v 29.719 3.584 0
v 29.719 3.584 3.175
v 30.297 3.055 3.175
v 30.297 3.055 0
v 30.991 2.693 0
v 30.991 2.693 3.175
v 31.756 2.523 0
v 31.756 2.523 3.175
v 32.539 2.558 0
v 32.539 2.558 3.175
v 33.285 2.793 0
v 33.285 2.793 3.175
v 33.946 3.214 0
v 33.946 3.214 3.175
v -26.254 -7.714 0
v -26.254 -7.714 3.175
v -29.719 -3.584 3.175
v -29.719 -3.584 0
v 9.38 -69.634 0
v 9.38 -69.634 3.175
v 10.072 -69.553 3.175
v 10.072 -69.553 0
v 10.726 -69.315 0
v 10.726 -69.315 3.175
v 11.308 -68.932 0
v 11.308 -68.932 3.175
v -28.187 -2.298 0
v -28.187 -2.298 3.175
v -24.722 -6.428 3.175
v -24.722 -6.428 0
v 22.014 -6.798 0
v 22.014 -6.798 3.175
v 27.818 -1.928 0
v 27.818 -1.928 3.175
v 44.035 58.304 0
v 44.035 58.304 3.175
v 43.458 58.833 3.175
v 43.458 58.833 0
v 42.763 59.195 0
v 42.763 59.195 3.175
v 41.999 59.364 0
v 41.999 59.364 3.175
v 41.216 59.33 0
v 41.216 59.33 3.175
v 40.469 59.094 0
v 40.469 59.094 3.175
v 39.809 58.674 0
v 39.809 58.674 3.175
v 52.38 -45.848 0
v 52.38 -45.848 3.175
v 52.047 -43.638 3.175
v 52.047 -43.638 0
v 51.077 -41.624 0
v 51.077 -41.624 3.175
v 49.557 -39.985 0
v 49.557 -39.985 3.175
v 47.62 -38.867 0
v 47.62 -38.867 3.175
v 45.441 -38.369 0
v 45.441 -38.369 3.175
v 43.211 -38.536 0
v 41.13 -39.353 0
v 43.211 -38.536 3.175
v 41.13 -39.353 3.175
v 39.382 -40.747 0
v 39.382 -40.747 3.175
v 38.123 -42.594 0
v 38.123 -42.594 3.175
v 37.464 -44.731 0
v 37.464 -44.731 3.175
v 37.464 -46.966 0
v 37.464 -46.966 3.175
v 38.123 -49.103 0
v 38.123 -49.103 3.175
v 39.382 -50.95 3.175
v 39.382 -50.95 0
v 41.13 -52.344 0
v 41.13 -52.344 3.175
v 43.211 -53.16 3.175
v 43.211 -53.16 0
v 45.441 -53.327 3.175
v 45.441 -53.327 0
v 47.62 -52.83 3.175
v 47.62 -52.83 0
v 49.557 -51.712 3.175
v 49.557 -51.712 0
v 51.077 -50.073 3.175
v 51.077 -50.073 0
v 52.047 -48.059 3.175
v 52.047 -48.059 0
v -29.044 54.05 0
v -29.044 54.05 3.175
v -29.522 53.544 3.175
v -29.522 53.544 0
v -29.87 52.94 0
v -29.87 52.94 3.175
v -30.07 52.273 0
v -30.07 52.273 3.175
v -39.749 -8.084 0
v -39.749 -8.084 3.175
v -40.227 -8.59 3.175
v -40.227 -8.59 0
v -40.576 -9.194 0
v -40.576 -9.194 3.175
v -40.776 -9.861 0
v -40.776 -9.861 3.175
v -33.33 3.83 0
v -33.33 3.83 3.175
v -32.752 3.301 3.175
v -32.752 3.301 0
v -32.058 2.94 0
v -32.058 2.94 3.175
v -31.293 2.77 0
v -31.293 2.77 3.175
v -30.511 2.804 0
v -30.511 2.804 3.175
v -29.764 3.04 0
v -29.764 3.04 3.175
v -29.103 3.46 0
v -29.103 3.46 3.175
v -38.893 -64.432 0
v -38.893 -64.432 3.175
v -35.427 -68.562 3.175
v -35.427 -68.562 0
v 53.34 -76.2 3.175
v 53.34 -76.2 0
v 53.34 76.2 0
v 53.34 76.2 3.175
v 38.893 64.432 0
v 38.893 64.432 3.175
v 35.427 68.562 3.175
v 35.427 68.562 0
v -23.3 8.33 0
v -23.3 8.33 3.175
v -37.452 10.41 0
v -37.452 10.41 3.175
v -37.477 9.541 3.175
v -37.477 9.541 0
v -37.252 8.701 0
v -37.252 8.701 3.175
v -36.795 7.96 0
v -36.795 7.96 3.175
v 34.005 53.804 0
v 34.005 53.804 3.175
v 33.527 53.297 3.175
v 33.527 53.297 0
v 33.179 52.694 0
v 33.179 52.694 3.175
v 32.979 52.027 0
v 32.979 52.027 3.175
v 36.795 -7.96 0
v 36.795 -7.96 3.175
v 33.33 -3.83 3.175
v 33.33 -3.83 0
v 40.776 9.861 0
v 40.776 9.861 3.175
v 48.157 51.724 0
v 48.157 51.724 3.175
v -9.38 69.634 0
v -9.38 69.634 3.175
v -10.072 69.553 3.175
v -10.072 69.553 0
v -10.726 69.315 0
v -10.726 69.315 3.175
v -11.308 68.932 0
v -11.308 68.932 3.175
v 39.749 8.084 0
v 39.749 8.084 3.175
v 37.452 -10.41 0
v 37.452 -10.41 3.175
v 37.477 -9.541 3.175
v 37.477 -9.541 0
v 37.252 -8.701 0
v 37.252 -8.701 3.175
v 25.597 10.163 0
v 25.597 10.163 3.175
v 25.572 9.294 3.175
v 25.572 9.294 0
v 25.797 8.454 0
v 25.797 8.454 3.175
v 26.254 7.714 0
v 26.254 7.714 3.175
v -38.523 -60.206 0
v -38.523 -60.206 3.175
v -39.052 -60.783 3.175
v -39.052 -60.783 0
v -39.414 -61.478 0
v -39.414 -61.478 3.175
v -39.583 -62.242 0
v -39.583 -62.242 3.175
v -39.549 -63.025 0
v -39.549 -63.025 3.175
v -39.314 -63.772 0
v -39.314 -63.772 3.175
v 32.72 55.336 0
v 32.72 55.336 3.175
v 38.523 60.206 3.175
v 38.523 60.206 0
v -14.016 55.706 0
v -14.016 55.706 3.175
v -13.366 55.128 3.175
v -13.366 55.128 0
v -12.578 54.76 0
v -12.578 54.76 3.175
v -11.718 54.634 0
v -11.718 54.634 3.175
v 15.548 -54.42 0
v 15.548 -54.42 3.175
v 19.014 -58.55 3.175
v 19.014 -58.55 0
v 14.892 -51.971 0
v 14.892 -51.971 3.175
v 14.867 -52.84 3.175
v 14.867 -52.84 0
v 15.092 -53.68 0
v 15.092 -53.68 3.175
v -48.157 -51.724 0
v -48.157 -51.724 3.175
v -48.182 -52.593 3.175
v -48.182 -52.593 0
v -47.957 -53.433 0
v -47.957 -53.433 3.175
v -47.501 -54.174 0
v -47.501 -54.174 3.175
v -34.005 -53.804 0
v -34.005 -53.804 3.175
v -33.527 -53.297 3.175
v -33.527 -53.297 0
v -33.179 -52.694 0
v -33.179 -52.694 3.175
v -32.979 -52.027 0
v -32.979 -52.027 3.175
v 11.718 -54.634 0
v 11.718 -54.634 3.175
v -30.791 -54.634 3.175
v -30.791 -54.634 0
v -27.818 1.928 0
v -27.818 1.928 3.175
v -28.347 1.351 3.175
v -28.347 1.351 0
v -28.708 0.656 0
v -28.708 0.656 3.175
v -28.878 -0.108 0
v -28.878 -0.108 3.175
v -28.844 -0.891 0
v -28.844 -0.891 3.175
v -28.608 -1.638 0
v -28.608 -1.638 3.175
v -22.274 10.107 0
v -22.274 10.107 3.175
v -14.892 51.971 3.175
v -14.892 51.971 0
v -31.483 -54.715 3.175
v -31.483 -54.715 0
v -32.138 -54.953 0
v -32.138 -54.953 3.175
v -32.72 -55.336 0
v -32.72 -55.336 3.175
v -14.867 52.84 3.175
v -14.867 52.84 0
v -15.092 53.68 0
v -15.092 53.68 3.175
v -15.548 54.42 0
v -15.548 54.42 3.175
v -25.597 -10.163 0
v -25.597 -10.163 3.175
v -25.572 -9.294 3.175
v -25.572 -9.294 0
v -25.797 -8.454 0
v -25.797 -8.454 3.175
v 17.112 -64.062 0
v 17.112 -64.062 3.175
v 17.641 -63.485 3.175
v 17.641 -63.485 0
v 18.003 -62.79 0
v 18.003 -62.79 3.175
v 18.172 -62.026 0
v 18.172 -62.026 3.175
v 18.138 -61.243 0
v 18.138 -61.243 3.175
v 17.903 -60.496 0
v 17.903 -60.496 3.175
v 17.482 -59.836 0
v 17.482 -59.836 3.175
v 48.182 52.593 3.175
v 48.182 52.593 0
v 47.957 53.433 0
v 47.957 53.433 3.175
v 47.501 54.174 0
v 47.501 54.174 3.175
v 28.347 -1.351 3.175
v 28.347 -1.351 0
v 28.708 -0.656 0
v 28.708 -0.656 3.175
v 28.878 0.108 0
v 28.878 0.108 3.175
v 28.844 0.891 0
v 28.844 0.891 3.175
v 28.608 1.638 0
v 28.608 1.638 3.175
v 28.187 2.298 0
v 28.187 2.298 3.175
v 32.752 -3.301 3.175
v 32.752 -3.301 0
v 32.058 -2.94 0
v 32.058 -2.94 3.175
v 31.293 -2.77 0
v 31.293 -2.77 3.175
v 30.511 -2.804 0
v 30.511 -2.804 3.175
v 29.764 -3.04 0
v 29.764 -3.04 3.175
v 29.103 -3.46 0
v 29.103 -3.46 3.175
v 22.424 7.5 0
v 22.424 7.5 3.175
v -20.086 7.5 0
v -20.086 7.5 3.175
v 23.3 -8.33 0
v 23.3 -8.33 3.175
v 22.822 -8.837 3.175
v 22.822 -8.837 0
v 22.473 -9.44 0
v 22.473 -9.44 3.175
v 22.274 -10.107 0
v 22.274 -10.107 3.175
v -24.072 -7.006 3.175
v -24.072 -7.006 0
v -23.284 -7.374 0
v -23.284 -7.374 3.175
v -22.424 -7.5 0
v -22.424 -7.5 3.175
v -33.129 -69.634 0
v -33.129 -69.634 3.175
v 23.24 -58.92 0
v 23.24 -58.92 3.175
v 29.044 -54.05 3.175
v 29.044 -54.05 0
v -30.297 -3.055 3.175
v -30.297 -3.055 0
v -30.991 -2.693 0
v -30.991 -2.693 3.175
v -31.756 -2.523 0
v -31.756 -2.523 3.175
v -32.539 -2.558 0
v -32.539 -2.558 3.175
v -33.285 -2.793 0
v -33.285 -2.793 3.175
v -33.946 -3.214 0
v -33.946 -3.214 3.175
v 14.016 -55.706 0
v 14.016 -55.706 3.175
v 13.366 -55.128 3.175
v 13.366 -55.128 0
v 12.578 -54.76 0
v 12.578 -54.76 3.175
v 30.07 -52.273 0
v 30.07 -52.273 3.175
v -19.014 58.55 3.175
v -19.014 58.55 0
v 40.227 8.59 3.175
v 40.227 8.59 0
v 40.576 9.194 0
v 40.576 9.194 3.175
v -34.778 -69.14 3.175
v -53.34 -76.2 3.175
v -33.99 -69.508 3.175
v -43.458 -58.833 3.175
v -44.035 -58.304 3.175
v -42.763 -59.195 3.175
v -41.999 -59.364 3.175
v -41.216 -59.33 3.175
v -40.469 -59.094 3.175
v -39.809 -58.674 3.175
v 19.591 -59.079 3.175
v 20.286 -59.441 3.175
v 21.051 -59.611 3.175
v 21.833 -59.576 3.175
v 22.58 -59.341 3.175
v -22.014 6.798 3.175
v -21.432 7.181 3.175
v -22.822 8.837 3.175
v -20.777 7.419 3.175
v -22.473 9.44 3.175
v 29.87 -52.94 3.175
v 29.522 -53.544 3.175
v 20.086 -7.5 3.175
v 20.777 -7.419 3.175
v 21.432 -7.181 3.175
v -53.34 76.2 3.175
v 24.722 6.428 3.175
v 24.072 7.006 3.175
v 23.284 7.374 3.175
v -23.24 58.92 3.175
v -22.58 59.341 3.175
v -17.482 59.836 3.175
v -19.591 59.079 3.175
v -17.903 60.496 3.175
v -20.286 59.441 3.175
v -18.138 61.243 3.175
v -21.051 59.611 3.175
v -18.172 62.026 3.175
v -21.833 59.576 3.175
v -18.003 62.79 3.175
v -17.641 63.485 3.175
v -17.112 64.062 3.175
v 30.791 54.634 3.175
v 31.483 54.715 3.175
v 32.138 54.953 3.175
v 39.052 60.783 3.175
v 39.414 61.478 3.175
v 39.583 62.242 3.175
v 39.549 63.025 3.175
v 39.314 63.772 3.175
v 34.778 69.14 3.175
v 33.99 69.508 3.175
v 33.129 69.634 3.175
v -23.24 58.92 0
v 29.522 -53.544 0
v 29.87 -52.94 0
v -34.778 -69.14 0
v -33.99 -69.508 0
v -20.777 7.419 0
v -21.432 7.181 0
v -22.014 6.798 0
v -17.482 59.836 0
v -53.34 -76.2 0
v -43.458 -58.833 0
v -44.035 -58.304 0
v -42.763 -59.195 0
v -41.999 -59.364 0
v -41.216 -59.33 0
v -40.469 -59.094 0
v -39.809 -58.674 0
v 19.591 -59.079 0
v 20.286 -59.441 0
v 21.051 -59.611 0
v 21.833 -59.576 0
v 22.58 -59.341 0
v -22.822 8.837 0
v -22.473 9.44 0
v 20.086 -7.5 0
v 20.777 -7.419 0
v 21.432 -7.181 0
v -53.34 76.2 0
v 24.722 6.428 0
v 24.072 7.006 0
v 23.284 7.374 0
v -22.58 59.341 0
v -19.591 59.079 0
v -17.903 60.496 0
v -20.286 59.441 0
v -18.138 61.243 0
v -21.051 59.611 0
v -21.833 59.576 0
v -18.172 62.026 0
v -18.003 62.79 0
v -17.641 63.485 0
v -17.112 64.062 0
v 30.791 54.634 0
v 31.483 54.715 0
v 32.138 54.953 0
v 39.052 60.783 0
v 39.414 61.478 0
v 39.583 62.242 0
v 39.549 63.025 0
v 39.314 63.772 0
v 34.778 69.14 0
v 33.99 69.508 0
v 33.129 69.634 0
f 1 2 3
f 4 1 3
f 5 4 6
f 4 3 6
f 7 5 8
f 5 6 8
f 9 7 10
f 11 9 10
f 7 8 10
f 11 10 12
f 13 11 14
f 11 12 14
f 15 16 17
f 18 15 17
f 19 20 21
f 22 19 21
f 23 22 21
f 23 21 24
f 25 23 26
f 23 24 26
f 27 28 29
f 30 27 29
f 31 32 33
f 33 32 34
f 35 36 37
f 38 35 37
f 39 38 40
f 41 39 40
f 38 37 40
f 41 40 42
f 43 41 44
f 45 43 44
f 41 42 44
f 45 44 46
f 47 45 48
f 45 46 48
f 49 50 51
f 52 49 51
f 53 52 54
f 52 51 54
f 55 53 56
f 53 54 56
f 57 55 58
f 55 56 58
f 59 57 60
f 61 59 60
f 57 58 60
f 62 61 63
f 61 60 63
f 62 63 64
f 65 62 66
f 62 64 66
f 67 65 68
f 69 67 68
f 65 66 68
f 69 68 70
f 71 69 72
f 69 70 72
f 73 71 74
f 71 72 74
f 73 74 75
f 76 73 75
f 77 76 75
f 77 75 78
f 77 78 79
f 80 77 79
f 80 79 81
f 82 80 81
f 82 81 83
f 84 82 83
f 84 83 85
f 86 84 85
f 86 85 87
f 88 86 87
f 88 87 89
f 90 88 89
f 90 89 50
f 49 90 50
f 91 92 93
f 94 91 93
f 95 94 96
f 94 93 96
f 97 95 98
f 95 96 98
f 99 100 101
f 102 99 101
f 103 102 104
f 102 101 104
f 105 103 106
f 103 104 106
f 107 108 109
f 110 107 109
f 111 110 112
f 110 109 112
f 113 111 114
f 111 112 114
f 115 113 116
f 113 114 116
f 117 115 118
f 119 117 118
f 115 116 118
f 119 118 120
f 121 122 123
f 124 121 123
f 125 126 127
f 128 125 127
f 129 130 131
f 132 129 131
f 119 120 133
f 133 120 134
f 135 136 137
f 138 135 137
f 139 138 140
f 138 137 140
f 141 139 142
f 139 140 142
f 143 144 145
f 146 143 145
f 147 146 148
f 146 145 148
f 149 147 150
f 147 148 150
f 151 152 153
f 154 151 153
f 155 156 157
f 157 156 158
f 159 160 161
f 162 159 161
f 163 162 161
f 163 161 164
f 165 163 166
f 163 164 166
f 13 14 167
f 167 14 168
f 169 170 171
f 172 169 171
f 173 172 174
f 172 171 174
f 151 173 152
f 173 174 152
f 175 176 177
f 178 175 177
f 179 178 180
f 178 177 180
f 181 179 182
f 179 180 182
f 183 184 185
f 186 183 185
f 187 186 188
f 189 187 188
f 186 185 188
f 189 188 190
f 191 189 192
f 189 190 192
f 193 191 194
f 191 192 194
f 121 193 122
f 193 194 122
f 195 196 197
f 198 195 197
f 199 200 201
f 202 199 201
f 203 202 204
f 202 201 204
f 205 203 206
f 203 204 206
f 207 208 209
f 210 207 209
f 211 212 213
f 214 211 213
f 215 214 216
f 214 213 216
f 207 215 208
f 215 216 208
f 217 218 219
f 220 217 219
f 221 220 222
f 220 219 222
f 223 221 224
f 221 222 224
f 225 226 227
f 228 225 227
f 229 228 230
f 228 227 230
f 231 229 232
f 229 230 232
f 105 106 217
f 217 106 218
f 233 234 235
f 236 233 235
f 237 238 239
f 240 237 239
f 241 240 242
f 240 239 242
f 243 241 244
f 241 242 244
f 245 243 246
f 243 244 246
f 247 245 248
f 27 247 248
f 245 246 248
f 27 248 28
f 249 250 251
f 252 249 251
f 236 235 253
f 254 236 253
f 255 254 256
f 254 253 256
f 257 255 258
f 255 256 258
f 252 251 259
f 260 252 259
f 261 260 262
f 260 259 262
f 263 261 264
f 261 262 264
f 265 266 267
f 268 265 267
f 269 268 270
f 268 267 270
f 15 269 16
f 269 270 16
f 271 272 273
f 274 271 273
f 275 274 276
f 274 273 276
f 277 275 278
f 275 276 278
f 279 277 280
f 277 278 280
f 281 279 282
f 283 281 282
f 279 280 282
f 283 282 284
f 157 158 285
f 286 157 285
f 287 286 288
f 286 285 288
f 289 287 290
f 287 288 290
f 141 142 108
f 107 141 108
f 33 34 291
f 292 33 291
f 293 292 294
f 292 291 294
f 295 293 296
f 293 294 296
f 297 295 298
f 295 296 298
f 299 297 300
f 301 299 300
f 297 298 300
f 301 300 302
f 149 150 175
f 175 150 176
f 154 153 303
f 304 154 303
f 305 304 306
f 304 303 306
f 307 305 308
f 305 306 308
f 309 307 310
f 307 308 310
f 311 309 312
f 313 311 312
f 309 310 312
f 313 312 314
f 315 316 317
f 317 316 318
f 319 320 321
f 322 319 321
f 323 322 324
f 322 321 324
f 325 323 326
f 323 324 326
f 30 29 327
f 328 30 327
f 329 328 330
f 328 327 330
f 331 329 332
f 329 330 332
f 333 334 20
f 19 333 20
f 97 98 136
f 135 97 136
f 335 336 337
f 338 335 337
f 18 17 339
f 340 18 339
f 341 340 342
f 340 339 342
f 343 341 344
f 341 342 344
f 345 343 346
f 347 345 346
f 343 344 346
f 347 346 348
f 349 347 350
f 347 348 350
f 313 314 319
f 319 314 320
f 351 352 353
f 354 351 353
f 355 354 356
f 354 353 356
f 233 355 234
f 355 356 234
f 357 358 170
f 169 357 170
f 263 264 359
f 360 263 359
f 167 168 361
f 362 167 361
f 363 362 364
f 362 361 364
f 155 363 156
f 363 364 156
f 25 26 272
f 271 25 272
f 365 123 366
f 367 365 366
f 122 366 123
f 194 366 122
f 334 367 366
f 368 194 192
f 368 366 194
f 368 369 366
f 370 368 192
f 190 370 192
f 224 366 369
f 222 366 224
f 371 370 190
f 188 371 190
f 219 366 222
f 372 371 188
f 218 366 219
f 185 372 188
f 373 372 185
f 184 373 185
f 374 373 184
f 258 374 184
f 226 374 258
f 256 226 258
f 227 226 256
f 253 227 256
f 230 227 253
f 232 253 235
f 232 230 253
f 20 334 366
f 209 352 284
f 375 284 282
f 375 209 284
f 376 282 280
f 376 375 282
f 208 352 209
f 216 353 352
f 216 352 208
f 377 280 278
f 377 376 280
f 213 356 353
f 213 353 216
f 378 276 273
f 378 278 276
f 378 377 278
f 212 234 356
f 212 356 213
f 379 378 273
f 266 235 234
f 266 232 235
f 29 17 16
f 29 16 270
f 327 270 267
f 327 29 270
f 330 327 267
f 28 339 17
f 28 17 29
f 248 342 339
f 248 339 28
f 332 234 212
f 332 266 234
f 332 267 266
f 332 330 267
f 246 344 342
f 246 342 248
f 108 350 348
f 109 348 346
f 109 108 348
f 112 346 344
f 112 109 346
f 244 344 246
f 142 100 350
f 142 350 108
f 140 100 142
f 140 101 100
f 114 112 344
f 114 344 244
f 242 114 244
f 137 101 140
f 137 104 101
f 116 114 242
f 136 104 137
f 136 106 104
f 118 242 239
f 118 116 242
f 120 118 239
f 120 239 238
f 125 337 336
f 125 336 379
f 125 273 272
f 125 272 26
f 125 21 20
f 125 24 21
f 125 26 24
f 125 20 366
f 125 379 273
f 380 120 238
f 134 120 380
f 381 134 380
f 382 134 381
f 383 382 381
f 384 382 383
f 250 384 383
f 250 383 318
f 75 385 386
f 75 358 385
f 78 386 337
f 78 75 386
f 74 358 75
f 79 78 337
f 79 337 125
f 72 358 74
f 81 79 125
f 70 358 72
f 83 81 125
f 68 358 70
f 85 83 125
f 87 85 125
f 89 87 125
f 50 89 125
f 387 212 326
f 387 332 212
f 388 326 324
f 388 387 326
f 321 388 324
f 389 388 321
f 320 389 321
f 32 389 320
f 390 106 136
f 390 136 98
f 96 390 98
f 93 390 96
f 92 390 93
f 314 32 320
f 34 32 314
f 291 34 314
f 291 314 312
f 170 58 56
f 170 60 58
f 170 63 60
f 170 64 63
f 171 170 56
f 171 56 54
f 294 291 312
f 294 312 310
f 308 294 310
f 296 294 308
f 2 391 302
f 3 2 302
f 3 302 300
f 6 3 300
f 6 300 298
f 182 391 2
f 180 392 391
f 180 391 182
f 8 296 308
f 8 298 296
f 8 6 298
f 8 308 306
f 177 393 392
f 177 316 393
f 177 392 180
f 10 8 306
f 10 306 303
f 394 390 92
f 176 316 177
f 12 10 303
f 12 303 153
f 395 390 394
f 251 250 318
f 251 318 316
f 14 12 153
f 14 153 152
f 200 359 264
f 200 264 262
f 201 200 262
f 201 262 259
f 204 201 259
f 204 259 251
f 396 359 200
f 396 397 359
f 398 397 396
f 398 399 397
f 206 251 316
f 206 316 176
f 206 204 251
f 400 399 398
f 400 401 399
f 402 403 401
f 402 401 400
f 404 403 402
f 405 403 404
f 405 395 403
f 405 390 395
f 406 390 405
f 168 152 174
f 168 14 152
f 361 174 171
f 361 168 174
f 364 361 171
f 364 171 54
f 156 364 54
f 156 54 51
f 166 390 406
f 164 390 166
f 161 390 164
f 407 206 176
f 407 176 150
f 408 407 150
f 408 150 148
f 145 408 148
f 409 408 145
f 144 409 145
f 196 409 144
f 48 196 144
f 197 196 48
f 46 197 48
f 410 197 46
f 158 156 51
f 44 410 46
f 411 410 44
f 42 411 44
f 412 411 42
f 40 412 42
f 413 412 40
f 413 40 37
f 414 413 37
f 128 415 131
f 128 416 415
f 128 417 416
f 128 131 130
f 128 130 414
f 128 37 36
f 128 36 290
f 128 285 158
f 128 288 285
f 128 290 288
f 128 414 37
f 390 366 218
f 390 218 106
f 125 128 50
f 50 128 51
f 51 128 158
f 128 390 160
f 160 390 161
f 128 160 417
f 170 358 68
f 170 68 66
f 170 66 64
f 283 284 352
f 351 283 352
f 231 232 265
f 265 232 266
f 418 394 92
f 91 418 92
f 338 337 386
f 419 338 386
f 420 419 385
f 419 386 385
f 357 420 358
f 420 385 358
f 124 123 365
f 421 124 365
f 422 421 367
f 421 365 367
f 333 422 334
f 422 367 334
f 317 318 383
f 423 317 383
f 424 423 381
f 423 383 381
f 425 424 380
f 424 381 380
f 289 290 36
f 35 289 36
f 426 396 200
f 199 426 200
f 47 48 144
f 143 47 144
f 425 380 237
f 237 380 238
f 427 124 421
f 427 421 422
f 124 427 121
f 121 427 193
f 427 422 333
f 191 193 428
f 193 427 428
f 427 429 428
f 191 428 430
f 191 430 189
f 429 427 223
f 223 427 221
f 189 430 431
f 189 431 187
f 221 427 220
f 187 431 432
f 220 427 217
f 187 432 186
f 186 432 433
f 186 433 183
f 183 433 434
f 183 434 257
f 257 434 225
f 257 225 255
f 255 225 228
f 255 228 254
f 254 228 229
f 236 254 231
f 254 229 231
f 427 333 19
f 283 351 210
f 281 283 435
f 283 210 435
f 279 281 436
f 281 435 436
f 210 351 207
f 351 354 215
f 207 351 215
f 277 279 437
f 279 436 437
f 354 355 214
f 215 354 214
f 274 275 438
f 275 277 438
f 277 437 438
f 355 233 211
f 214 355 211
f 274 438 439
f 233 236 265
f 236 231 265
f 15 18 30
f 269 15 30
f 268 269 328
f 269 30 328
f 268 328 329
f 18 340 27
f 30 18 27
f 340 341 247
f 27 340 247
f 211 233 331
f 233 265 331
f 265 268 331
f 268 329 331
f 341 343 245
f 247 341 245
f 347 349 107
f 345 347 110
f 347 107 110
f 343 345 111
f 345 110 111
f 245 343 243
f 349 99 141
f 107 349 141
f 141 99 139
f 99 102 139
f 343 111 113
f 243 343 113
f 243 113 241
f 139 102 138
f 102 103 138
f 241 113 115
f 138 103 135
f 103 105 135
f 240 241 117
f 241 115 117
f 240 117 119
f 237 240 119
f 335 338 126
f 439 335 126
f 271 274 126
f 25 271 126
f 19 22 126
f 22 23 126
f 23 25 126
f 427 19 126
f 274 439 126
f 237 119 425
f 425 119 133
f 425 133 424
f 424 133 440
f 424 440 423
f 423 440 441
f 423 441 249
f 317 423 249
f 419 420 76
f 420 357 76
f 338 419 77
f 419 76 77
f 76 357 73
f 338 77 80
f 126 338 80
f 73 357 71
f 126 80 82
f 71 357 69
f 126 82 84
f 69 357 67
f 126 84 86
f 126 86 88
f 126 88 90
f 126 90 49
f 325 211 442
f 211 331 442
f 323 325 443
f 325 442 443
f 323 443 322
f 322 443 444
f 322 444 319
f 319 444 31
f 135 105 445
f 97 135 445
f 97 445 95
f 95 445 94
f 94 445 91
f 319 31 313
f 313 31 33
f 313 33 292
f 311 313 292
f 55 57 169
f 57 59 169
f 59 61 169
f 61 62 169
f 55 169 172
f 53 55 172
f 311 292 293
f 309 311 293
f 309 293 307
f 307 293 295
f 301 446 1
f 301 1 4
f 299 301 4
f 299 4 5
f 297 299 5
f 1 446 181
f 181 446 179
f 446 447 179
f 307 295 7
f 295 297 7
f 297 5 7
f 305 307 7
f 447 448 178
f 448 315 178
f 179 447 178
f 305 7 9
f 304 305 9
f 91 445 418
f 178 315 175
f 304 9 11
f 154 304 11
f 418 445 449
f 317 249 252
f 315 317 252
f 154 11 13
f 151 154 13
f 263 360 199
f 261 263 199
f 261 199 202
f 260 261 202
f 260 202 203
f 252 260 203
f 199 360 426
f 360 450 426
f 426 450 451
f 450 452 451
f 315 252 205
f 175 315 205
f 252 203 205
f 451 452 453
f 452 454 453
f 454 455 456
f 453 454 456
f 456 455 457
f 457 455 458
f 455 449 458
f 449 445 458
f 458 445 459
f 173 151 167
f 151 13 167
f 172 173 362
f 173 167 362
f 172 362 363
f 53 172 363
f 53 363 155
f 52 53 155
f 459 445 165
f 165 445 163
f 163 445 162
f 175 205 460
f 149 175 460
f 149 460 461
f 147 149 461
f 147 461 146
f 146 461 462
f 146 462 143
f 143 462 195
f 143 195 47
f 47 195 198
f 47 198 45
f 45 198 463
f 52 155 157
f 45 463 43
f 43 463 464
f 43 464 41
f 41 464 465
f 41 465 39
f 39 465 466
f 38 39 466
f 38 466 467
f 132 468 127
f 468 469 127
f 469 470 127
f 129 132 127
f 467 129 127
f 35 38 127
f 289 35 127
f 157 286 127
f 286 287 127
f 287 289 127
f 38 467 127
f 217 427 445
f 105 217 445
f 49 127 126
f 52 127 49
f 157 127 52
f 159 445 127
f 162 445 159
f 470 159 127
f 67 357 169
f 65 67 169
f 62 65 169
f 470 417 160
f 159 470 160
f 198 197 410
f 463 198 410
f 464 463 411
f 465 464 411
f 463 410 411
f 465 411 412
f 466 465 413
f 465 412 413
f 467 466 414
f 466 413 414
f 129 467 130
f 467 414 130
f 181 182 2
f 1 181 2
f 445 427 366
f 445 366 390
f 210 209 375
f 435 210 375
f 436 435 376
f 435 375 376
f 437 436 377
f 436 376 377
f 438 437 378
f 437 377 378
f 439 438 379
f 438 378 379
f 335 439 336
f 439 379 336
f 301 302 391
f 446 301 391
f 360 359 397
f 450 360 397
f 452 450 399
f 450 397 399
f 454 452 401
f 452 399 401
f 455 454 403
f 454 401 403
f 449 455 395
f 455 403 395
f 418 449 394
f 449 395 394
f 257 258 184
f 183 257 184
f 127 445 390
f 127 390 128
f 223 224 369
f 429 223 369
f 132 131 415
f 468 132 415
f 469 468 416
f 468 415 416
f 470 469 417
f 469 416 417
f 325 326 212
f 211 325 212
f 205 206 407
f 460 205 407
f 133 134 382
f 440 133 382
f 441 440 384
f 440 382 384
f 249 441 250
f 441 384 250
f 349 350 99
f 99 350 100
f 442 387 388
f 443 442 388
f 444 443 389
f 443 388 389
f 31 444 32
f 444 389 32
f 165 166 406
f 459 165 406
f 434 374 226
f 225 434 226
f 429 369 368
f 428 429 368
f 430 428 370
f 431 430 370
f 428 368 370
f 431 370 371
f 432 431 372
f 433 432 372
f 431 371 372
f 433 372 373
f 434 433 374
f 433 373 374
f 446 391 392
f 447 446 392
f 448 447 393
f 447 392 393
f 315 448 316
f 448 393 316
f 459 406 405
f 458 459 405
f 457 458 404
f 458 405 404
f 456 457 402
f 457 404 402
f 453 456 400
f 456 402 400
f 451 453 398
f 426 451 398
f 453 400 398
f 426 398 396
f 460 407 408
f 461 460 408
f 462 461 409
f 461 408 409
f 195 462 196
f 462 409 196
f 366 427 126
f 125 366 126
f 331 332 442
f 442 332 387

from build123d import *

# Parameters (mm, degrees)
F0_W     = 106.68
F0_H     = 152.4
F1_DEPTH = 3.175
F2_R     = 7.5
F3_DEPTH = 3.176


with BuildPart() as f1:
    # F0 (on Top) → F1 (new body)
    with BuildSketch(Plane.XY):
        Rectangle(F0_W, F0_H)
    extrude(amount=F1_DEPTH)

    # F2 (on face) → F3 (cut, through all)
    with BuildSketch(Plane.XY.offset(3.175)):
        with BuildLine():
            Line((-32.719586, -55.33588), (-38.523153, -60.20565))
            ThreePointArc((-38.523153, -60.20565), (-39.583374, -62.242316), (-38.892923, -64.432146))
            Line((-38.892923, -64.432146), (-35.427249, -68.562376))
            ThreePointArc((-35.427249, -68.562376), (-34.396971, -69.352936), (-33.129116, -69.634013))
            Line((-33.129116, -69.634013), (9.380051, -69.634013))
            ThreePointArc((9.380051, -69.634013), (10.406111, -69.453091), (11.308413, -68.932146))
            Line((11.308413, -68.932146), (17.11198, -64.062376))
            ThreePointArc((17.11198, -64.062376), (18.172201, -62.02571), (17.48175, -59.83588))
            Line((17.48175, -59.83588), (14.016076, -55.70565))
            ThreePointArc((14.016076, -55.70565), (12.985798, -54.91509), (11.717943, -54.634013))
            Line((11.717943, -54.634013), (-30.791223, -54.634013))
            ThreePointArc((-30.791223, -54.634013), (-31.817284, -54.814935), (-32.719586, -55.33588))
        make_face()
        with BuildLine():
            ThreePointArc((-44.035224, -58.303791), (-41.998558, -59.364012), (-39.808728, -58.673561))
            Line((-39.808728, -58.673561), (-34.005161, -53.803791))
            ThreePointArc((-34.005161, -53.803791), (-33.335448, -53.005657), (-32.979101, -52.026602))
            Line((-32.979101, -52.026602), (-25.597462, -10.163245))
            ThreePointArc((-25.597462, -10.163245), (-25.654107, -8.865844), (-26.253752, -7.713938))
            Line((-26.253752, -7.713938), (-29.719426, -3.583709))
            ThreePointArc((-29.719426, -3.583709), (-31.756092, -2.523487), (-33.945922, -3.213938))
            Line((-33.945922, -3.213938), (-39.749488, -8.083709))
            ThreePointArc((-39.749488, -8.083709), (-40.419202, -8.881842), (-40.775549, -9.860897))
            Line((-40.775549, -9.860897), (-48.157188, -51.724254))
            ThreePointArc((-48.157188, -51.724254), (-48.100542, -53.021656), (-47.500898, -54.173561))
            Line((-47.500898, -54.173561), (-44.035224, -58.303791))
        make_face()
        with BuildLine():
            ThreePointArc((14.891875, -51.970768), (14.948521, -53.268169), (15.548165, -54.420075))
            Line((15.548165, -54.420075), (19.013839, -58.550304))
            ThreePointArc((19.013839, -58.550304), (21.050505, -59.610526), (23.240335, -58.920075))
            Line((23.240335, -58.920075), (29.043902, -54.050304))
            ThreePointArc((29.043902, -54.050304), (29.713615, -53.252171), (30.069962, -52.273116))
            Line((30.069962, -52.273116), (37.451602, -10.409759))
            ThreePointArc((37.451602, -10.409759), (37.394956, -9.112357), (36.795312, -7.960452))
            Line((36.795312, -7.960452), (33.329638, -3.830222))
            ThreePointArc((33.329638, -3.830222), (31.292972, -2.770001), (29.103141, -3.460452))
            Line((29.103141, -3.460452), (23.299575, -8.330222))
            ThreePointArc((23.299575, -8.330222), (22.629862, -9.128356), (22.273515, -10.107411))
            Line((22.273515, -10.107411), (14.891875, -51.970768))
        make_face()
        with BuildLine():
            ThreePointArc((-27.817566, 1.928363), (-28.877788, -0.108303), (-28.187337, -2.298133))
            Line((-28.187337, -2.298133), (-24.721663, -6.428363))
            ThreePointArc((-24.721663, -6.428363), (-23.691384, -7.218923), (-22.423529, -7.5))
            Line((-22.423529, -7.5), (20.085637, -7.5))
            ThreePointArc((20.085637, -7.5), (21.111697, -7.319078), (22.014, -6.798133))
            Line((22.014, -6.798133), (27.817566, -1.928363))
            ThreePointArc((27.817566, -1.928363), (28.877788, 0.108303), (28.187337, 2.298133))
            Line((28.187337, 2.298133), (24.721663, 6.428363))
            ThreePointArc((24.721663, 6.428363), (23.691384, 7.218923), (22.423529, 7.5))
            Line((22.423529, 7.5), (-20.085637, 7.5))
            ThreePointArc((-20.085637, 7.5), (-21.111697, 7.319078), (-22.014, 6.798133))
            Line((-22.014, 6.798133), (-27.817566, 1.928363))
        make_face()
        with BuildLine():
            ThreePointArc((-33.329638, 3.830222), (-31.292972, 2.770001), (-29.103141, 3.460452))
            Line((-29.103141, 3.460452), (-23.299575, 8.330222))
            ThreePointArc((-23.299575, 8.330222), (-22.629862, 9.128356), (-22.273515, 10.107411))
            Line((-22.273515, 10.107411), (-14.891875, 51.970768))
            ThreePointArc((-14.891875, 51.970768), (-14.948521, 53.268169), (-15.548165, 54.420075))
            Line((-15.548165, 54.420075), (-19.013839, 58.550304))
            ThreePointArc((-19.013839, 58.550304), (-21.050505, 59.610526), (-23.240335, 58.920075))
            Line((-23.240335, 58.920075), (-29.043902, 54.050304))
            ThreePointArc((-29.043902, 54.050304), (-29.713615, 53.252171), (-30.069962, 52.273116))
            Line((-30.069962, 52.273116), (-37.451602, 10.409759))
            ThreePointArc((-37.451602, 10.409759), (-37.394956, 9.112357), (-36.795312, 7.960452))
            Line((-36.795312, 7.960452), (-33.329638, 3.830222))
        make_face()
        with BuildLine():
            ThreePointArc((25.597462, 10.163245), (25.654107, 8.865844), (26.253752, 7.713938))
            Line((26.253752, 7.713938), (29.719426, 3.583709))
            ThreePointArc((29.719426, 3.583709), (31.756092, 2.523487), (33.945922, 3.213938))
            Line((33.945922, 3.213938), (39.749488, 8.083709))
            ThreePointArc((39.749488, 8.083709), (40.419202, 8.881842), (40.775549, 9.860897))
            Line((40.775549, 9.860897), (48.157188, 51.724254))
            ThreePointArc((48.157188, 51.724254), (48.100542, 53.021656), (47.500898, 54.173561))
            Line((47.500898, 54.173561), (44.035224, 58.303791))
            ThreePointArc((44.035224, 58.303791), (41.998558, 59.364012), (39.808728, 58.673561))
            Line((39.808728, 58.673561), (34.005161, 53.803791))
            ThreePointArc((34.005161, 53.803791), (33.335448, 53.005657), (32.979101, 52.026602))
            Line((32.979101, 52.026602), (25.597462, 10.163245))
        make_face()
        with BuildLine():
            ThreePointArc((-17.11198, 64.062376), (-18.172201, 62.02571), (-17.48175, 59.83588))
            Line((-17.48175, 59.83588), (-14.016076, 55.70565))
            ThreePointArc((-14.016076, 55.70565), (-12.985798, 54.91509), (-11.717943, 54.634013))
            Line((-11.717943, 54.634013), (30.791223, 54.634013))
            ThreePointArc((30.791223, 54.634013), (31.817284, 54.814935), (32.719586, 55.33588))
            Line((32.719586, 55.33588), (38.523153, 60.20565))
            ThreePointArc((38.523153, 60.20565), (39.583374, 62.242316), (38.892923, 64.432146))
            Line((38.892923, 64.432146), (35.427249, 68.562376))
            ThreePointArc((35.427249, 68.562376), (34.396971, 69.352936), (33.129116, 69.634013))
            Line((33.129116, 69.634013), (-9.380051, 69.634013))
            ThreePointArc((-9.380051, 69.634013), (-10.406111, 69.453091), (-11.308413, 68.932146))
            Line((-11.308413, 68.932146), (-17.11198, 64.062376))
        make_face()
        with Locations((44.880354, -45.848438)):
            Circle(F2_R)
    extrude(amount=-F3_DEPTH, mode=Mode.SUBTRACT)


solid = f1.part
